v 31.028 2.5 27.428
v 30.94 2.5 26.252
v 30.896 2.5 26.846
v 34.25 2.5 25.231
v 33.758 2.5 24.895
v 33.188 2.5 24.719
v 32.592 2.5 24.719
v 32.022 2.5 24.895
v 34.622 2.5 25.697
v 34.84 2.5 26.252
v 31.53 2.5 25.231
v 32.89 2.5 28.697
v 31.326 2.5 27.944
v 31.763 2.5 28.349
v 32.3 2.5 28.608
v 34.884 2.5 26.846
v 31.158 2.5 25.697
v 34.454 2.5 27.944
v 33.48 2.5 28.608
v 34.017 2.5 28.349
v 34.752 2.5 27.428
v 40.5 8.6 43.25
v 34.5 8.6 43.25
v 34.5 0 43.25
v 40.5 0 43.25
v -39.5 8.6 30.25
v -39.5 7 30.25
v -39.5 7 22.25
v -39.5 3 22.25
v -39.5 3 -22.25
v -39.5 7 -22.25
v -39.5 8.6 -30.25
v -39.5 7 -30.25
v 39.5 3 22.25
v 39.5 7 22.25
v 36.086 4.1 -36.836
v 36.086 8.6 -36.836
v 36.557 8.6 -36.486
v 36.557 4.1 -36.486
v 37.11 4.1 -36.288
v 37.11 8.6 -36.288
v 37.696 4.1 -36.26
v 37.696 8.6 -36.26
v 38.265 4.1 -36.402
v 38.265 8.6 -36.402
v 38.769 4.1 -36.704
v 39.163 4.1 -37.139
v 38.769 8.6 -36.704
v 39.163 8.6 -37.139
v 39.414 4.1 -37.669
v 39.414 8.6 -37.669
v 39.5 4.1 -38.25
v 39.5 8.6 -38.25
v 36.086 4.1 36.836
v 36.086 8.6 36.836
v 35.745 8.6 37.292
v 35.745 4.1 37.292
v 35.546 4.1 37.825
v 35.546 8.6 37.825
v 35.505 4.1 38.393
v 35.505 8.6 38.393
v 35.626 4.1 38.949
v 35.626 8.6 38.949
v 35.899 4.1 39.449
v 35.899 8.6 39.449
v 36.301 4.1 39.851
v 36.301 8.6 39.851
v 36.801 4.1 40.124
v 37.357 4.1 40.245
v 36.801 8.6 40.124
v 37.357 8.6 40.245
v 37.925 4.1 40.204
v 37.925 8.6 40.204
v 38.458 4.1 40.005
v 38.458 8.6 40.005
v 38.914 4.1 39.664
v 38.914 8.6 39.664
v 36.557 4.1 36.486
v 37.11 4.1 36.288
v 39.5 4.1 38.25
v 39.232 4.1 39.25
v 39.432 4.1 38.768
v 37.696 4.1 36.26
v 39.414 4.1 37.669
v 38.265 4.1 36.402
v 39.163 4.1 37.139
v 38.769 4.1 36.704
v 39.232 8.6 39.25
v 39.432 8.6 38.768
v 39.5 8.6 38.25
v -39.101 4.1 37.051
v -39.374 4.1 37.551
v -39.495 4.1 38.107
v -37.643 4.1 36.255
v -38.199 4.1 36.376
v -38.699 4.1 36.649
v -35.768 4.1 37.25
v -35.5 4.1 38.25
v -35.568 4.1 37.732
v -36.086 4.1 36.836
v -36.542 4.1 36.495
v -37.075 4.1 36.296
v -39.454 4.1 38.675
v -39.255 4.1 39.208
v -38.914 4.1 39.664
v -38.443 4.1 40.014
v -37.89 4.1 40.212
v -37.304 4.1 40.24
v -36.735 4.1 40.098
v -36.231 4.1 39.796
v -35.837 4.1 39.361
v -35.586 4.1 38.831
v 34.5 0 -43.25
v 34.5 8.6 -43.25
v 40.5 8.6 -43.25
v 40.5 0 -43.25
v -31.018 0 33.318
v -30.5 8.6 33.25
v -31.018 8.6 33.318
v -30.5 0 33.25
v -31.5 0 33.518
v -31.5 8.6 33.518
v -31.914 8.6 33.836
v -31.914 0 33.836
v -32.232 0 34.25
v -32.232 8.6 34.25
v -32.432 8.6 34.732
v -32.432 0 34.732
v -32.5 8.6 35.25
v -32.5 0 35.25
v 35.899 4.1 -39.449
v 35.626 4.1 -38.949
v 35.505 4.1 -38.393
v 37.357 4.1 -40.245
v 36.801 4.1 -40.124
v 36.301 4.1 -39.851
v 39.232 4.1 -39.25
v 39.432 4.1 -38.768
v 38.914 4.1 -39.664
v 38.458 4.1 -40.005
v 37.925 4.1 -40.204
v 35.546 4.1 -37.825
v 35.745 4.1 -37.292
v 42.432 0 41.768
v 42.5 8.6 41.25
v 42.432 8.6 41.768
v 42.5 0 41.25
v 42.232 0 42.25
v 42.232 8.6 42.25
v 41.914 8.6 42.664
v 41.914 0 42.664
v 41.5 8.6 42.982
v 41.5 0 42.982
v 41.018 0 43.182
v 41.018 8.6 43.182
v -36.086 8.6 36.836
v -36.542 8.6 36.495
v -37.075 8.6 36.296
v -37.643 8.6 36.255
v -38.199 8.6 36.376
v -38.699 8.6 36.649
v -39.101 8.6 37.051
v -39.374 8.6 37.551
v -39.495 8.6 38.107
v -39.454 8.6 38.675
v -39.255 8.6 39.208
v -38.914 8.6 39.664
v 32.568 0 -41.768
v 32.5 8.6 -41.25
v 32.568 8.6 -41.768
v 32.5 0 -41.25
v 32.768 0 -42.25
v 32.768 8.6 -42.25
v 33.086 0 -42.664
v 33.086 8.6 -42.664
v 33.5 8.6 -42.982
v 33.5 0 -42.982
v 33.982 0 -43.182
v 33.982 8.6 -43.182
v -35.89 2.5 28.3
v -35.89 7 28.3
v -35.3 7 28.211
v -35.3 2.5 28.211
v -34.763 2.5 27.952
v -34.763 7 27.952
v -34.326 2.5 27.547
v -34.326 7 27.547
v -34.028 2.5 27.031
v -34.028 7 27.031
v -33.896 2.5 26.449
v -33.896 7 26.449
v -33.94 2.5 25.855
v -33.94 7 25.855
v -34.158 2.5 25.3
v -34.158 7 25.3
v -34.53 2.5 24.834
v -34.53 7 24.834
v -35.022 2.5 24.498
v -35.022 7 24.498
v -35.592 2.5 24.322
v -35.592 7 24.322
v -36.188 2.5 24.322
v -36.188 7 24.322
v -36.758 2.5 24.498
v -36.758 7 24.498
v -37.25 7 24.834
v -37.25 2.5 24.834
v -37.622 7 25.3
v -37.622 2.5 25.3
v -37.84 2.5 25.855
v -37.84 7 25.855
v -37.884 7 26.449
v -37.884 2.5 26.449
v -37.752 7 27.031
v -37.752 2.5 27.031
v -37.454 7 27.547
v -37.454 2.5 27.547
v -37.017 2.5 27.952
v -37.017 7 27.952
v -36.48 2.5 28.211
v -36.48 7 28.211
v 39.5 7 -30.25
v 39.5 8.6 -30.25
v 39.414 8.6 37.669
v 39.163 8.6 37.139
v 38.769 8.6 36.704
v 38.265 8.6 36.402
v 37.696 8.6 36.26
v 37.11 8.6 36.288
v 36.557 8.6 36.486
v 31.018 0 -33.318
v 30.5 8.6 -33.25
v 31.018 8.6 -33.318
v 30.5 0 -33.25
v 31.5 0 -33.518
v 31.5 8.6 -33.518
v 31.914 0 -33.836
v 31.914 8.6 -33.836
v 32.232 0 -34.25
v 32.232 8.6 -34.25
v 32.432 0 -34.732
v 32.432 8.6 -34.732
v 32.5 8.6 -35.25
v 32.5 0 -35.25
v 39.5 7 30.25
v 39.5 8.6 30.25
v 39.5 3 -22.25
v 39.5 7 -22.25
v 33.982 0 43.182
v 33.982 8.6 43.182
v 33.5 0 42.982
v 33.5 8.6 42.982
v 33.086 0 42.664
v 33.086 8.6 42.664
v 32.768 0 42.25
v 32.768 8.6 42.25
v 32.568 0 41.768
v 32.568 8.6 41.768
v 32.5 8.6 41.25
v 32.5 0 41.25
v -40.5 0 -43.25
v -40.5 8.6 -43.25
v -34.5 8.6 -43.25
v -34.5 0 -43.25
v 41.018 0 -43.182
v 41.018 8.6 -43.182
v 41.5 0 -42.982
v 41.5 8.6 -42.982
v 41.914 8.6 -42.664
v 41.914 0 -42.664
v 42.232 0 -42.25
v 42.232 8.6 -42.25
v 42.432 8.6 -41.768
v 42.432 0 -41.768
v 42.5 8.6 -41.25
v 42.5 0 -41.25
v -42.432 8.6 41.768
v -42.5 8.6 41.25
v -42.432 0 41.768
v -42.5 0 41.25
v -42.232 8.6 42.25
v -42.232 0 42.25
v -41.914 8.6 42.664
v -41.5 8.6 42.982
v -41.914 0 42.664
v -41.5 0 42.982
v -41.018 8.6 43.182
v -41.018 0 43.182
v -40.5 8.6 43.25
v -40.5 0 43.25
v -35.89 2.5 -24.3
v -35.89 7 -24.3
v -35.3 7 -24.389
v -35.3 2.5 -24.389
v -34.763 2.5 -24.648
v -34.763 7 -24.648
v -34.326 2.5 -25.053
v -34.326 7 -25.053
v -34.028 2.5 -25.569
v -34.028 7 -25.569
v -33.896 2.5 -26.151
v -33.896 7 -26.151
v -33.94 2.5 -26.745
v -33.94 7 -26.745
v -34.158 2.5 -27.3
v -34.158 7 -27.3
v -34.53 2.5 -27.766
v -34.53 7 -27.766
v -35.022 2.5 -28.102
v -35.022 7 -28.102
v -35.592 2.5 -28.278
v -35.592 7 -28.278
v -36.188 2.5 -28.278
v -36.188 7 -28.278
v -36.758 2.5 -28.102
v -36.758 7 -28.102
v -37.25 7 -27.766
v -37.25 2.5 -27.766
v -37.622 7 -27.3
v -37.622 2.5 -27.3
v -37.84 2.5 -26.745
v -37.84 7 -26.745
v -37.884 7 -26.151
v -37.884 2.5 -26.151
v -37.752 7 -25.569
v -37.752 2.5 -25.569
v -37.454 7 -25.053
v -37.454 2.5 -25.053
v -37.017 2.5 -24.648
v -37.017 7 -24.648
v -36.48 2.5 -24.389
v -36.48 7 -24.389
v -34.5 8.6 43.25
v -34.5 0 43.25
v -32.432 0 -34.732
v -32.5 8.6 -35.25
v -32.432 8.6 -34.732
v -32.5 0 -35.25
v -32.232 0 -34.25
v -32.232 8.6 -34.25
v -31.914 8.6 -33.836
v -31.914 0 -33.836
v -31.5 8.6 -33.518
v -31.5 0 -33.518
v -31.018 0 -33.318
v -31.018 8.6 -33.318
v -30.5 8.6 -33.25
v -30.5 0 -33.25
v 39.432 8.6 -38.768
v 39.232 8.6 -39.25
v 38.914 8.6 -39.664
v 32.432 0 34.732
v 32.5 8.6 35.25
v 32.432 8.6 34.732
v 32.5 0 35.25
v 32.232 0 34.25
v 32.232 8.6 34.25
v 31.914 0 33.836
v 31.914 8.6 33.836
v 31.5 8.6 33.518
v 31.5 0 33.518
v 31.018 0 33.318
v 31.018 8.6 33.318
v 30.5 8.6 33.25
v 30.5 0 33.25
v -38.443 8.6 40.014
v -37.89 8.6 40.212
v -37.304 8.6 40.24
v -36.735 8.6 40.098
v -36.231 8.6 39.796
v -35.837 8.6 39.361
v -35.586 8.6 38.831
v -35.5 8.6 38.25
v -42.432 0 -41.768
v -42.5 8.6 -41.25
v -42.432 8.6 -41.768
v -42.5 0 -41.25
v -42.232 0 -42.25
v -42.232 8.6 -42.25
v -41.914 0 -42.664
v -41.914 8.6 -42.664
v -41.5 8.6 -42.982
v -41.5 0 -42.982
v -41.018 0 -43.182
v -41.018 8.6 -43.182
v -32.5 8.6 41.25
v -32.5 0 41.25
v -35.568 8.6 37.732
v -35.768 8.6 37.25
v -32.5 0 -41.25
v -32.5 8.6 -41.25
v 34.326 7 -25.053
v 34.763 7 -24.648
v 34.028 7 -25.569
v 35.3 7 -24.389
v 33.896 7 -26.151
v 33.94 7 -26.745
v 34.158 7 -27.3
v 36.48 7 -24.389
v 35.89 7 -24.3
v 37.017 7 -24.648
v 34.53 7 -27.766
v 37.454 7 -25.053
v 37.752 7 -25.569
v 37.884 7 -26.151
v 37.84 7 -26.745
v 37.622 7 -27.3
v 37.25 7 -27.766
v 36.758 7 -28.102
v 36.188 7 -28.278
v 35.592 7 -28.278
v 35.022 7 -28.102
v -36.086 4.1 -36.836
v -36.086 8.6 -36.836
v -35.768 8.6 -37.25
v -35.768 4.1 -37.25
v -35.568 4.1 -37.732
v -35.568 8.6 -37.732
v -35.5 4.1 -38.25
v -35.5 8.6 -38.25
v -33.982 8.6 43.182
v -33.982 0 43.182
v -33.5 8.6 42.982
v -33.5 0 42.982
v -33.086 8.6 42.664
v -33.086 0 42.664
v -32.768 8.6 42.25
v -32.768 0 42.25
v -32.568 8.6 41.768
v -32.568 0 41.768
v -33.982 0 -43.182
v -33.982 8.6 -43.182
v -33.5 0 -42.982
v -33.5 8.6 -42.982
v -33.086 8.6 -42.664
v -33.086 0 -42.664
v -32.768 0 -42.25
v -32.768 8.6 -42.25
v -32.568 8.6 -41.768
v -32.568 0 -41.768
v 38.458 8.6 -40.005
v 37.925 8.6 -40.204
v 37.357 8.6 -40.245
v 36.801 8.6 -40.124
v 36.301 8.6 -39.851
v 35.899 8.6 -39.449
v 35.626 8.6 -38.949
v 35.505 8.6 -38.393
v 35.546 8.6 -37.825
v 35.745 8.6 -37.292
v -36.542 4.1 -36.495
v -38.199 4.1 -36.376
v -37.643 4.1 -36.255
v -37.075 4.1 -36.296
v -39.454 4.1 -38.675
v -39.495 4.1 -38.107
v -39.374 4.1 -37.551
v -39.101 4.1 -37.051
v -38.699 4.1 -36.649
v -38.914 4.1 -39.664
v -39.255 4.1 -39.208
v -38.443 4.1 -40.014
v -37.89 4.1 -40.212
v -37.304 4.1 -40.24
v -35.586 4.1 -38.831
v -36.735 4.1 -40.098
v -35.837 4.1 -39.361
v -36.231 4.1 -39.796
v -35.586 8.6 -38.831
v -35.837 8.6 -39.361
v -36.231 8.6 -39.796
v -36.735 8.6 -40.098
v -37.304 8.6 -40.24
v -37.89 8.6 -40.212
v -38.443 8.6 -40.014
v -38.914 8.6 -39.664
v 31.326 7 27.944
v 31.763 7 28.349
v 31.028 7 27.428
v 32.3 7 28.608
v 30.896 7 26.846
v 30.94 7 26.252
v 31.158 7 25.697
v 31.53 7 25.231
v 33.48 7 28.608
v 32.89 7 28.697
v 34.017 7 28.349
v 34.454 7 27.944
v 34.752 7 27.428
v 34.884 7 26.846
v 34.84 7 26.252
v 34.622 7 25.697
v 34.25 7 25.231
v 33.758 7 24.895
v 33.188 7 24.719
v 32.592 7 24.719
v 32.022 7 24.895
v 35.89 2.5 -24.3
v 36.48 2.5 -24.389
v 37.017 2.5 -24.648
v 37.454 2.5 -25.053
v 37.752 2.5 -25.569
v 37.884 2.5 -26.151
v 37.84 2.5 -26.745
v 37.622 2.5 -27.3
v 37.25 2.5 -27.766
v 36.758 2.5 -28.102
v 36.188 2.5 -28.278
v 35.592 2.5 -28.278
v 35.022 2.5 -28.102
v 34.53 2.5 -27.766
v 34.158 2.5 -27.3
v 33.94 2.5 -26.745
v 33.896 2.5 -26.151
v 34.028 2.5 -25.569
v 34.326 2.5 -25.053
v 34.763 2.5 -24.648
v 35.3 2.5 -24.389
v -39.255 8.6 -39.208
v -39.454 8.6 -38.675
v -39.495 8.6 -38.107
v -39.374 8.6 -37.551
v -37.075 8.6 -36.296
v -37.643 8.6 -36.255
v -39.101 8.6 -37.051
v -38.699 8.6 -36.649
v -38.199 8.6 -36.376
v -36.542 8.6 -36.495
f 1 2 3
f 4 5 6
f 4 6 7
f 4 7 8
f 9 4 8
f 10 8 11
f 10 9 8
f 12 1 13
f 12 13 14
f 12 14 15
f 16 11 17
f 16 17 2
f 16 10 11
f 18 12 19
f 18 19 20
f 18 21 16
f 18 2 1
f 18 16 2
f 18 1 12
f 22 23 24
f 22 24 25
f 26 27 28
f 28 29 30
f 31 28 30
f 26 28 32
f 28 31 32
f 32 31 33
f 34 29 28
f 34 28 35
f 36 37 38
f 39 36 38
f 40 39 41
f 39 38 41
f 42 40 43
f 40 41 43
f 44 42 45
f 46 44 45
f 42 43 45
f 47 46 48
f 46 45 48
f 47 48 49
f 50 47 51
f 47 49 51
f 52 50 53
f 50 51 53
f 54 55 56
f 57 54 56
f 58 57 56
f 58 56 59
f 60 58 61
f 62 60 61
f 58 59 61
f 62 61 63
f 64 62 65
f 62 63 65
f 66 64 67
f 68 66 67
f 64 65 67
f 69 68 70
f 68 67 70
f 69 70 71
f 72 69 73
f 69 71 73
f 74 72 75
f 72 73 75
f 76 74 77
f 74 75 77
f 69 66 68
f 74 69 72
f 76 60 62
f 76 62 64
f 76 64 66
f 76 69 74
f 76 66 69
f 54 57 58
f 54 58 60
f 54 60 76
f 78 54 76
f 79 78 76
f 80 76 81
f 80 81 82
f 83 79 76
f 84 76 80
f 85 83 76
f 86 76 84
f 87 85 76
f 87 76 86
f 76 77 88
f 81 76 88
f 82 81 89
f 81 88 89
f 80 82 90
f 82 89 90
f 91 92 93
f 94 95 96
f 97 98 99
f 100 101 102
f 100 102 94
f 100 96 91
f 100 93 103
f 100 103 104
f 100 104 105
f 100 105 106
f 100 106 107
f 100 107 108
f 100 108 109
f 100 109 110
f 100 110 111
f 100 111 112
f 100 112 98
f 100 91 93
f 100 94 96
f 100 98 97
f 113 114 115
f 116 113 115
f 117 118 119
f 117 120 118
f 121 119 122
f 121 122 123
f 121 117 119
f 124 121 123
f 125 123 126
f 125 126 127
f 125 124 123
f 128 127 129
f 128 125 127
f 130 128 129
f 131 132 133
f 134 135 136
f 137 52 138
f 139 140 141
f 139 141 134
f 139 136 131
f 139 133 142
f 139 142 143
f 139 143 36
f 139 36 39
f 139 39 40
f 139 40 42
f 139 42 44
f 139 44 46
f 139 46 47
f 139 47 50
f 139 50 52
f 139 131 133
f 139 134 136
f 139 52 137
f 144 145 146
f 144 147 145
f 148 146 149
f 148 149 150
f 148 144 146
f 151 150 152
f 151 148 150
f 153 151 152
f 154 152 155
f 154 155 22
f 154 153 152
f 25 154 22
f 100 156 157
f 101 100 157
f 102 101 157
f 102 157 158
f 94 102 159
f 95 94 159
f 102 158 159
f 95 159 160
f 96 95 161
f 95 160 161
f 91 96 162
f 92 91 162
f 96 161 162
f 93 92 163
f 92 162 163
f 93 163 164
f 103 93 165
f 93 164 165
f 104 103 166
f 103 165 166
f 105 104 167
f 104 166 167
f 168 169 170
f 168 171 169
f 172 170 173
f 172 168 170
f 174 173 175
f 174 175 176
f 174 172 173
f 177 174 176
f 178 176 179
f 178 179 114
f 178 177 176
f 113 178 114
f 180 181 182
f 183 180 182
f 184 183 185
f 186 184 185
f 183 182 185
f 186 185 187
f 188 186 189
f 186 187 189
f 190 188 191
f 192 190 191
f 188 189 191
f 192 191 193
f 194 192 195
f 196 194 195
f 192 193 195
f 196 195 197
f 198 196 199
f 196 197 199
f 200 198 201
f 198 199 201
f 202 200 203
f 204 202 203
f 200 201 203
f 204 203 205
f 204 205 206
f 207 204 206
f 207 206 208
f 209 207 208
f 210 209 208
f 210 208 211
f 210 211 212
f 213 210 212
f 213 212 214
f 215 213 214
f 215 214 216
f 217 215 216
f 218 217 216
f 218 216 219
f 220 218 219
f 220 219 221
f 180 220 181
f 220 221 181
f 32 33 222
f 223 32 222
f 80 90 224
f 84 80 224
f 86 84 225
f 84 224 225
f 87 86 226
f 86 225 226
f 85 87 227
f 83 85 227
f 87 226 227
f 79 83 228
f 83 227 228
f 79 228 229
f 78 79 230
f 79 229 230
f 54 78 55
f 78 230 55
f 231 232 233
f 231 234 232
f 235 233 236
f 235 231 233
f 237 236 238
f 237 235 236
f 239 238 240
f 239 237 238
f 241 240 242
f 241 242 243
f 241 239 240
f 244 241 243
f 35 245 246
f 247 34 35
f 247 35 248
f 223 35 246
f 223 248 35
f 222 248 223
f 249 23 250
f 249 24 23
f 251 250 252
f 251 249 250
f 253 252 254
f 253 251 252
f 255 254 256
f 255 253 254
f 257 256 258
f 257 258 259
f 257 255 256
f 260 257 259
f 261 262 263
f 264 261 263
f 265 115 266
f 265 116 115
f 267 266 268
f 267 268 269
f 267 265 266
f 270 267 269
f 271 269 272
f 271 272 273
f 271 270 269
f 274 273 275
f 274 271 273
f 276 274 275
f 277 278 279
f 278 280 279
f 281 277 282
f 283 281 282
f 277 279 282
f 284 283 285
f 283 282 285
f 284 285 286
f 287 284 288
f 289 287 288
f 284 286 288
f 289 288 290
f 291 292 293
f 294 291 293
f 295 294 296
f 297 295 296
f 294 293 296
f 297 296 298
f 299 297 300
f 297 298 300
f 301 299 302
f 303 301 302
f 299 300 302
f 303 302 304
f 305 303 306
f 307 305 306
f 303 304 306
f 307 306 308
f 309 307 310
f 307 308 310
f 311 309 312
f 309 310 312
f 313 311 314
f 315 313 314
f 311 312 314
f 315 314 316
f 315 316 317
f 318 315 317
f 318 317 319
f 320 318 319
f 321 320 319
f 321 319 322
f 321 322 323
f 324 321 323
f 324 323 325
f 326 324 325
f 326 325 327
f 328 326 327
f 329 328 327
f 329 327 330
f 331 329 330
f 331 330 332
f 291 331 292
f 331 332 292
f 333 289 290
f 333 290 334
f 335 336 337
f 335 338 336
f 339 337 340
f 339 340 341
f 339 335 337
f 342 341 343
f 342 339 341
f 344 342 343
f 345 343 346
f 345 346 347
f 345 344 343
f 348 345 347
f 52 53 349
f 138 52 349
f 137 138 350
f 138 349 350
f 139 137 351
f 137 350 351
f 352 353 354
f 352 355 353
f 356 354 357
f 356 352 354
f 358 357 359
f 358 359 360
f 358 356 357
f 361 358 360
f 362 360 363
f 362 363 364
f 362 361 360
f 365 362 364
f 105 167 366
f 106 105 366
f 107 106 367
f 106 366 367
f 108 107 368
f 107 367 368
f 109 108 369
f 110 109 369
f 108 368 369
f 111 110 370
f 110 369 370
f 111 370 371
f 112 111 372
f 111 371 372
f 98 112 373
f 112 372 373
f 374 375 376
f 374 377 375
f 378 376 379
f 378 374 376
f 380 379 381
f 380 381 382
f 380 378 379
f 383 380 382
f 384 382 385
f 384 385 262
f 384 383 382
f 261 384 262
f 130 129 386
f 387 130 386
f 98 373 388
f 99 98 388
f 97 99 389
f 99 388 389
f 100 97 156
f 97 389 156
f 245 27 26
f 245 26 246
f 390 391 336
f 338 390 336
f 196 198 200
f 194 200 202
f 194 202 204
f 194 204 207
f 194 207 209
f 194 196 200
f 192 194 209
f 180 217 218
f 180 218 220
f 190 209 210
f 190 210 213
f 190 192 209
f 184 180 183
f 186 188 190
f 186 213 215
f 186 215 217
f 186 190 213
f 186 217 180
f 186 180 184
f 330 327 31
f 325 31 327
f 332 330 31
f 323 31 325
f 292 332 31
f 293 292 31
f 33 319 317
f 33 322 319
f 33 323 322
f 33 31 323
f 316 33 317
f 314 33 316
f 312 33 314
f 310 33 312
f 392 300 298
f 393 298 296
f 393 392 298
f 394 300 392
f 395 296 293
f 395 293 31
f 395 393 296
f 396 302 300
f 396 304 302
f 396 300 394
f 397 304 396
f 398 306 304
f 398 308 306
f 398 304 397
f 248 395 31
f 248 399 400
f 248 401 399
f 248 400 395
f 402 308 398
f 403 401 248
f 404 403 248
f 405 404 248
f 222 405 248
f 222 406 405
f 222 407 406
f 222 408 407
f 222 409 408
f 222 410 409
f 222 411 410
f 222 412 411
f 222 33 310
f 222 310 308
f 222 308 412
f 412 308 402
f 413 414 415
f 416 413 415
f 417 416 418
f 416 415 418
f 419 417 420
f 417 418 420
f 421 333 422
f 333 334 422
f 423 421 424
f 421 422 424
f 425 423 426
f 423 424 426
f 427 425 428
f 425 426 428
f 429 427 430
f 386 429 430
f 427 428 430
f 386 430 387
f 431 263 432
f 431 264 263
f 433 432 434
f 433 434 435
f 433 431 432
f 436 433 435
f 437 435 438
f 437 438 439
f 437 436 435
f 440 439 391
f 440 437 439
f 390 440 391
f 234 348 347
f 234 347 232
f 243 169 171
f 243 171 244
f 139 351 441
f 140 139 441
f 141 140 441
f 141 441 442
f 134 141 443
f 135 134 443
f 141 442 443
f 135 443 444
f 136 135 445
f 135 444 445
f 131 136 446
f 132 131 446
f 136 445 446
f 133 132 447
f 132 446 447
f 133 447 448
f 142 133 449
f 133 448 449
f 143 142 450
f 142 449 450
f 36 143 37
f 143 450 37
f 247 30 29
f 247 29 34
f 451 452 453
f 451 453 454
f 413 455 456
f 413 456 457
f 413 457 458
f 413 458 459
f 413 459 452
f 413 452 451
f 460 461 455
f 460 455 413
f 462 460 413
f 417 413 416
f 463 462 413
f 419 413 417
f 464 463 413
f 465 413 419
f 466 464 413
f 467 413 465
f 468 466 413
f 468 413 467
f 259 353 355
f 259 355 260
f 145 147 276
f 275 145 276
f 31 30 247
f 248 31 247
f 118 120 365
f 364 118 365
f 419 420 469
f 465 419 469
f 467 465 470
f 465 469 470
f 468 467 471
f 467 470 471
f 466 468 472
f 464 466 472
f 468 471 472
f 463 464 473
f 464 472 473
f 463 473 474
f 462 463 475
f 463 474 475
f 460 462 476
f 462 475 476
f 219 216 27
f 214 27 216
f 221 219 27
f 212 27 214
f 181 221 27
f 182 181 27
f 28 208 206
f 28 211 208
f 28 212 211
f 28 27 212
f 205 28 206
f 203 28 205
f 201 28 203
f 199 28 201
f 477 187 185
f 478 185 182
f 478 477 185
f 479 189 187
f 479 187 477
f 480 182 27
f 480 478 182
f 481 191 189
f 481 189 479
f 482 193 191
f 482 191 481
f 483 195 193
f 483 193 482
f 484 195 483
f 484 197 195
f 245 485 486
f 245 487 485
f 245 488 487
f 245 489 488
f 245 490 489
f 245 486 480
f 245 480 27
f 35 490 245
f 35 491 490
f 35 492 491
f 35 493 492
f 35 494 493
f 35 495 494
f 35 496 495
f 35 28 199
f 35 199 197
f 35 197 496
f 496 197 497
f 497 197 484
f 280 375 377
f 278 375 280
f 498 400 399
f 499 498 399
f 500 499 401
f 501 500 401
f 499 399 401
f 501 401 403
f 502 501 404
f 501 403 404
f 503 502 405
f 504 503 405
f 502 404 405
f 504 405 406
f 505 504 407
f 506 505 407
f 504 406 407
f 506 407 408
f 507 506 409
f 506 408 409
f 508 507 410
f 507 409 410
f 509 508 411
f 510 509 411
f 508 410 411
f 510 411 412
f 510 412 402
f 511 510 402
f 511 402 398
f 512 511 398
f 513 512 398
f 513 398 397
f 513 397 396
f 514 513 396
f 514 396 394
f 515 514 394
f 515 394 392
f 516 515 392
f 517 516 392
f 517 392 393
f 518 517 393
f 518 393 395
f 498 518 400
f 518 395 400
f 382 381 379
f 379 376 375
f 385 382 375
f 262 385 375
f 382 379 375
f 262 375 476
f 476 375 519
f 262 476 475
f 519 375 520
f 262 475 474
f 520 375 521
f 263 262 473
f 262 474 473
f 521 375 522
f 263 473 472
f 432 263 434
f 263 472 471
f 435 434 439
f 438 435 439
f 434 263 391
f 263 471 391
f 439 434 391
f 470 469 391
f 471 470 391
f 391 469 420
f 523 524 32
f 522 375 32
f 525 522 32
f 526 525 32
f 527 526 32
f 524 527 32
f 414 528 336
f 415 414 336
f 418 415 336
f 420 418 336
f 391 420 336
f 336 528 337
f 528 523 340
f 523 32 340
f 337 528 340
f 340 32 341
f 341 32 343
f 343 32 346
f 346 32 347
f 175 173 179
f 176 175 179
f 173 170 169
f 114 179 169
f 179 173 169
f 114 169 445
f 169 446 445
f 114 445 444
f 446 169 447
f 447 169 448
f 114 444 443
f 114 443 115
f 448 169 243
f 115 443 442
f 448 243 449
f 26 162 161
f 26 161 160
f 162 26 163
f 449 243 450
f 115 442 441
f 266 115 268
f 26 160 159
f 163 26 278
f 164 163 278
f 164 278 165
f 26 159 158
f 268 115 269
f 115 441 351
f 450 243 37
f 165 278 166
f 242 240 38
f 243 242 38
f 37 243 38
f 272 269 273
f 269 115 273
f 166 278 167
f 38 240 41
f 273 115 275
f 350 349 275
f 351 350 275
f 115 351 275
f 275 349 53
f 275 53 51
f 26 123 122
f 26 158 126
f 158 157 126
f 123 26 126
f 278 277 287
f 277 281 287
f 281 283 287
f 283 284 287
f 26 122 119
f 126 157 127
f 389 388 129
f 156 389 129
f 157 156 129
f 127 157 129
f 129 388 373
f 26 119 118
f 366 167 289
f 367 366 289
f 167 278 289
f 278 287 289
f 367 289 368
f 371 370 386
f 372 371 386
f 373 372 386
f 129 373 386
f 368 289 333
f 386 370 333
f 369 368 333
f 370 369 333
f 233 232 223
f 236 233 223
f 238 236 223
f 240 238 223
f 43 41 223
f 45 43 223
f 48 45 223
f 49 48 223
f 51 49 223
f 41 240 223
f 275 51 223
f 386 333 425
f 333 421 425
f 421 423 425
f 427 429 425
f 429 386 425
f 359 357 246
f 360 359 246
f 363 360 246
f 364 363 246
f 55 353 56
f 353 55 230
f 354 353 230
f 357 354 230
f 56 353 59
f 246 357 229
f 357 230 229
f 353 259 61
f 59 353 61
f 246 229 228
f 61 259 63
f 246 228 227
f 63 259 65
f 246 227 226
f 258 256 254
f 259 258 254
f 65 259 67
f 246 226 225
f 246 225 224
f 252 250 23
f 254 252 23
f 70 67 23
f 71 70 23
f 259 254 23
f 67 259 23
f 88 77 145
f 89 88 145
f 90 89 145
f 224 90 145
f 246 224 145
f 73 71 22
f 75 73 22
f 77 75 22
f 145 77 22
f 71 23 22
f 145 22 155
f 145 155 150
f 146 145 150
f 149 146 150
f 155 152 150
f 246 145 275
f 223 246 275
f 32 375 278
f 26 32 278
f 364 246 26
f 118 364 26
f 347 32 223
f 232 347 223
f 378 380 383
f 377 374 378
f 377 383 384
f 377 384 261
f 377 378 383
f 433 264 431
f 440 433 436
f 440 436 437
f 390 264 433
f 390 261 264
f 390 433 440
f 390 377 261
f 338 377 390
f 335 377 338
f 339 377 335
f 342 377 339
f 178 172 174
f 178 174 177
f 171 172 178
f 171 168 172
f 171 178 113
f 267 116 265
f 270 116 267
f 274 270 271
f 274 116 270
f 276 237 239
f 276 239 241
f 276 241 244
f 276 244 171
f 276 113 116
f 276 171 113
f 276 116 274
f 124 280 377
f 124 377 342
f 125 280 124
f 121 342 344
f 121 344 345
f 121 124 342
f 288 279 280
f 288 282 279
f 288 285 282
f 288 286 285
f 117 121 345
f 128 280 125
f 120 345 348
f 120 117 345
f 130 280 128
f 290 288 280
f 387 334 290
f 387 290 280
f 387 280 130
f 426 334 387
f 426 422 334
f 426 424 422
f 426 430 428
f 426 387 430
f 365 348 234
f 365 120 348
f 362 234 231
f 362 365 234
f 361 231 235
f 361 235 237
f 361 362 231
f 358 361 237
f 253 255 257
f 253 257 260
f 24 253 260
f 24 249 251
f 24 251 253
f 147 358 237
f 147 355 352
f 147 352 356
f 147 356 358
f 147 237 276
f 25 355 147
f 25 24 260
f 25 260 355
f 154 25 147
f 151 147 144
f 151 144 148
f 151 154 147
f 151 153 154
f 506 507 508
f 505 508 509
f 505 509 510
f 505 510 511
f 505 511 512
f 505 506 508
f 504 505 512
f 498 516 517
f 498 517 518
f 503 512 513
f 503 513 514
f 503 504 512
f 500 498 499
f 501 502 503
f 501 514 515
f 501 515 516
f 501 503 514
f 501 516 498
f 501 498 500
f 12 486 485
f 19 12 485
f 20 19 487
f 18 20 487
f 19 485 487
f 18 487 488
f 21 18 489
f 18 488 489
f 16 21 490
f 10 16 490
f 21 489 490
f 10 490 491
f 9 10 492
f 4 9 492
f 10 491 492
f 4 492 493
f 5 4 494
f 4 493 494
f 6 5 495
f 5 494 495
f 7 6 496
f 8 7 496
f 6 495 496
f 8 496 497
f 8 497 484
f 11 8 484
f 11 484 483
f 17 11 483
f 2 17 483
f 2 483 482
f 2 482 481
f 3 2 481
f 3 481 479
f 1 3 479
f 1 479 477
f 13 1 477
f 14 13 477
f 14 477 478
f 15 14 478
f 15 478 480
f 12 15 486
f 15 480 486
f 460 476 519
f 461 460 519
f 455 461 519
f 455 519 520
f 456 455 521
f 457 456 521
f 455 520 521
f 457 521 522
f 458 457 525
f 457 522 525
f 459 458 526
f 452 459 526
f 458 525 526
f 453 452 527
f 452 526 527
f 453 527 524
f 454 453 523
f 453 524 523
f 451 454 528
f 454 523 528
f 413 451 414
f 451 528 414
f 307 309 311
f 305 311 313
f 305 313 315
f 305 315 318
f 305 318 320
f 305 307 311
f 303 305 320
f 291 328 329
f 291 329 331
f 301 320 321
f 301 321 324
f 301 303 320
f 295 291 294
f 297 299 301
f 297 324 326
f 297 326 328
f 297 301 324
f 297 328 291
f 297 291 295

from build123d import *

# Parameters (mm, degrees)
SKETCH2_W           = 85
SKETCH2_H           = 66.5
BOSS_EXTRUDE2_DEPTH = 3
SKETCH3_W           = 85
SKETCH3_H           = 66.5
SKETCH3_W_2         = 79
SKETCH3_H_2         = 60.5
SKETCH3_H_3         = 8
BOSS_EXTRUDE3_DEPTH = 4
SKETCH4_R           = 2
CUT_EXTRUDE1_DEPTH  = 4.5
SKETCH5_W           = 85
SKETCH5_H           = 66.5
SKETCH5_W_2         = 79
SKETCH5_H_2         = 60.5
BOSS_EXTRUDE4_DEPTH = 1.6
BOSS_EXTRUDE5_START = -8.6
SKETCH6_W           = 10
SKETCH6_H           = 10
BOSS_EXTRUDE5_DEPTH = 8.6
CUT_EXTRUDE2_DEPTH  = 4.5
FILLET1_R           = 2


with BuildPart() as part:
    # Sketch2 → Boss-Extrude2 (new body)
    with BuildSketch(Plane(origin=(0, 0, 0), x_dir=(1, 0, 0), z_dir=(0, 1, 0))):
        Rectangle(SKETCH2_W, SKETCH2_H)
    extrude(amount=BOSS_EXTRUDE2_DEPTH)

    # Sketch3 → Boss-Extrude3 (add)
    # profile 1 of 3: a face of its own
    with BuildSketch(Plane(origin=(0, 3, 0), x_dir=(1, 0, 0), z_dir=(0, 1, 0))):
        Rectangle(SKETCH3_W, SKETCH3_H)
        Rectangle(SKETCH3_W_2, SKETCH3_H_2, mode=Mode.SUBTRACT)
    # profile 2 of 3: a face of its own
    with BuildSketch(Plane(origin=(0, 3, 0), x_dir=(1, 0, 0), z_dir=(0, 1, 0))):
        with Locations((0, 26.25)):
            Rectangle(SKETCH3_W_2, SKETCH3_H_3)
    # profile 3 of 3: a face of its own
    with BuildSketch(Plane(origin=(0, 3, 0), x_dir=(1, 0, 0), z_dir=(0, 1, 0))):
        with Locations((0, -26.25)):
            Rectangle(SKETCH3_W_2, SKETCH3_H_3)
    extrude(amount=BOSS_EXTRUDE3_DEPTH)

    # Sketch4 → Cut-Extrude1 (cut)
    with BuildSketch(Plane(origin=(0, 7, 0), x_dir=(1, 0, 0), z_dir=(0, 1, 0))):
        with Locations(Location((-35.89, 26.3, 0), (0, 0, 270))):
            Circle(SKETCH4_R)
        with Locations(Location((-35.89, -26.3, 0), (0, 0, 270))):
            Circle(SKETCH4_R)
        with Locations(Location((35.89, 26.3, 0), (0, 0, 270))):
            Circle(SKETCH4_R)
        with Locations(Location((32.89, -26.69684774, 0), (0, 0, 270))):
            Circle(SKETCH4_R)
    extrude(amount=-CUT_EXTRUDE1_DEPTH, mode=Mode.SUBTRACT)

    # Sketch5 → Boss-Extrude4 (add)
    with BuildSketch(Plane(origin=(0, 7, 0), x_dir=(1, 0, 0), z_dir=(0, 1, 0))):
        Rectangle(SKETCH5_W, SKETCH5_H)
        Rectangle(SKETCH5_W_2, SKETCH5_H_2, mode=Mode.SUBTRACT)
    extrude(amount=BOSS_EXTRUDE4_DEPTH)

    # Sketch6 → Boss-Extrude5 (add)
    with BuildSketch(Plane.XZ.offset(BOSS_EXTRUDE5_START)):
        with Locations((-37.5, -38.25)):
            Rectangle(SKETCH6_W, SKETCH6_H)
        with Locations((37.5, -38.25)):
            Rectangle(SKETCH6_W, SKETCH6_H)
        with Locations((37.5, 38.25)):
            Rectangle(SKETCH6_W, SKETCH6_H)
        with Locations((-37.5, 38.25)):
            Rectangle(SKETCH6_W, SKETCH6_H)
    extrude(amount=BOSS_EXTRUDE5_DEPTH)

    # Sketch7 → Cut-Extrude2 (cut)
    with BuildSketch(Plane(origin=(0, 8.6, 0), x_dir=(1, 0, 0), z_dir=(0, 1, 0))):
        with BuildLine():
            ThreePointArc((-38.914213562, 39.664213562), (-38.914213562, 36.835786438), (-36.085786438, 36.835786438))
            Line((-36.085786438, 36.835786438), (-38.914213562, 39.664213562))
        make_face()
        with BuildLine():
            Line((-38.914213562, 39.664213562), (-36.085786438, 36.835786438))
            ThreePointArc((-36.085786438, 36.835786438), (-35.652240935, 37.484633135), (-35.5, 38.25))
            ThreePointArc((-35.5, 38.25), (-36.734633135, 40.097759065), (-38.914213562, 39.664213562))
        make_face()
        with BuildLine():
            ThreePointArc((38.914213562, 39.664213562), (36.085786438, 39.664213562), (36.085786438, 36.835786438))
            Line((36.085786438, 36.835786438), (38.914213562, 39.664213562))
        make_face()
        with BuildLine():
            Line((38.914213562, 39.664213562), (36.085786438, 36.835786438))
            ThreePointArc((36.085786438, 36.835786438), (38.265366865, 36.402240935), (39.5, 38.25))
            ThreePointArc((39.5, 38.25), (39.347759065, 39.015366865), (38.914213562, 39.664213562))
        make_face()
        with BuildLine():
            ThreePointArc((39.5, -38.25), (38.265366865, -36.402240935), (36.085786438, -36.835786438))
            Line((36.085786438, -36.835786438), (38.914213562, -39.664213562))
            ThreePointArc((38.914213562, -39.664213562), (39.347759065, -39.015366865), (39.5, -38.25))
        make_face()
        with BuildLine():
            Line((38.914213562, -39.664213562), (36.085786438, -36.835786438))
            ThreePointArc((36.085786438, -36.835786438), (36.085786438, -39.664213562), (38.914213562, -39.664213562))
        make_face()
        with BuildLine():
            ThreePointArc((-36.085786438, -36.835786438), (-38.914213562, -36.835786438), (-38.914213562, -39.664213562))
            Line((-38.914213562, -39.664213562), (-36.085786438, -36.835786438))
        make_face()
        with BuildLine():
            Line((-36.085786438, -36.835786438), (-38.914213562, -39.664213562))
            ThreePointArc((-38.914213562, -39.664213562), (-36.734633135, -40.097759065), (-35.5, -38.25))
            ThreePointArc((-35.5, -38.25), (-35.652240935, -37.484633135), (-36.085786438, -36.835786438))
        make_face()
    extrude(amount=-CUT_EXTRUDE2_DEPTH, mode=Mode.SUBTRACT)

    # Fillet1
    fillet1_edges = [part.edges().sort_by_distance(p)[0] for p in [
        (42.5, 4.3, -43.25),
        (32.5, 4.3, -43.25),
        (32.5, 4.3, -33.25),
        (42.5, 4.3, 43.25),
        (32.5, 4.3, 33.25),
        (32.5, 4.3, 43.25),
        (-42.5, 4.3, 43.25),
        (-32.5, 4.3, 43.25),
        (-32.5, 4.3, 33.25),
        (-42.5, 4.3, -43.25),
        (-32.5, 4.3, -33.25),
        (-32.5, 4.3, -43.25),
    ]]
    fillet(fillet1_edges, radius=FILLET1_R)


solid = part.part
